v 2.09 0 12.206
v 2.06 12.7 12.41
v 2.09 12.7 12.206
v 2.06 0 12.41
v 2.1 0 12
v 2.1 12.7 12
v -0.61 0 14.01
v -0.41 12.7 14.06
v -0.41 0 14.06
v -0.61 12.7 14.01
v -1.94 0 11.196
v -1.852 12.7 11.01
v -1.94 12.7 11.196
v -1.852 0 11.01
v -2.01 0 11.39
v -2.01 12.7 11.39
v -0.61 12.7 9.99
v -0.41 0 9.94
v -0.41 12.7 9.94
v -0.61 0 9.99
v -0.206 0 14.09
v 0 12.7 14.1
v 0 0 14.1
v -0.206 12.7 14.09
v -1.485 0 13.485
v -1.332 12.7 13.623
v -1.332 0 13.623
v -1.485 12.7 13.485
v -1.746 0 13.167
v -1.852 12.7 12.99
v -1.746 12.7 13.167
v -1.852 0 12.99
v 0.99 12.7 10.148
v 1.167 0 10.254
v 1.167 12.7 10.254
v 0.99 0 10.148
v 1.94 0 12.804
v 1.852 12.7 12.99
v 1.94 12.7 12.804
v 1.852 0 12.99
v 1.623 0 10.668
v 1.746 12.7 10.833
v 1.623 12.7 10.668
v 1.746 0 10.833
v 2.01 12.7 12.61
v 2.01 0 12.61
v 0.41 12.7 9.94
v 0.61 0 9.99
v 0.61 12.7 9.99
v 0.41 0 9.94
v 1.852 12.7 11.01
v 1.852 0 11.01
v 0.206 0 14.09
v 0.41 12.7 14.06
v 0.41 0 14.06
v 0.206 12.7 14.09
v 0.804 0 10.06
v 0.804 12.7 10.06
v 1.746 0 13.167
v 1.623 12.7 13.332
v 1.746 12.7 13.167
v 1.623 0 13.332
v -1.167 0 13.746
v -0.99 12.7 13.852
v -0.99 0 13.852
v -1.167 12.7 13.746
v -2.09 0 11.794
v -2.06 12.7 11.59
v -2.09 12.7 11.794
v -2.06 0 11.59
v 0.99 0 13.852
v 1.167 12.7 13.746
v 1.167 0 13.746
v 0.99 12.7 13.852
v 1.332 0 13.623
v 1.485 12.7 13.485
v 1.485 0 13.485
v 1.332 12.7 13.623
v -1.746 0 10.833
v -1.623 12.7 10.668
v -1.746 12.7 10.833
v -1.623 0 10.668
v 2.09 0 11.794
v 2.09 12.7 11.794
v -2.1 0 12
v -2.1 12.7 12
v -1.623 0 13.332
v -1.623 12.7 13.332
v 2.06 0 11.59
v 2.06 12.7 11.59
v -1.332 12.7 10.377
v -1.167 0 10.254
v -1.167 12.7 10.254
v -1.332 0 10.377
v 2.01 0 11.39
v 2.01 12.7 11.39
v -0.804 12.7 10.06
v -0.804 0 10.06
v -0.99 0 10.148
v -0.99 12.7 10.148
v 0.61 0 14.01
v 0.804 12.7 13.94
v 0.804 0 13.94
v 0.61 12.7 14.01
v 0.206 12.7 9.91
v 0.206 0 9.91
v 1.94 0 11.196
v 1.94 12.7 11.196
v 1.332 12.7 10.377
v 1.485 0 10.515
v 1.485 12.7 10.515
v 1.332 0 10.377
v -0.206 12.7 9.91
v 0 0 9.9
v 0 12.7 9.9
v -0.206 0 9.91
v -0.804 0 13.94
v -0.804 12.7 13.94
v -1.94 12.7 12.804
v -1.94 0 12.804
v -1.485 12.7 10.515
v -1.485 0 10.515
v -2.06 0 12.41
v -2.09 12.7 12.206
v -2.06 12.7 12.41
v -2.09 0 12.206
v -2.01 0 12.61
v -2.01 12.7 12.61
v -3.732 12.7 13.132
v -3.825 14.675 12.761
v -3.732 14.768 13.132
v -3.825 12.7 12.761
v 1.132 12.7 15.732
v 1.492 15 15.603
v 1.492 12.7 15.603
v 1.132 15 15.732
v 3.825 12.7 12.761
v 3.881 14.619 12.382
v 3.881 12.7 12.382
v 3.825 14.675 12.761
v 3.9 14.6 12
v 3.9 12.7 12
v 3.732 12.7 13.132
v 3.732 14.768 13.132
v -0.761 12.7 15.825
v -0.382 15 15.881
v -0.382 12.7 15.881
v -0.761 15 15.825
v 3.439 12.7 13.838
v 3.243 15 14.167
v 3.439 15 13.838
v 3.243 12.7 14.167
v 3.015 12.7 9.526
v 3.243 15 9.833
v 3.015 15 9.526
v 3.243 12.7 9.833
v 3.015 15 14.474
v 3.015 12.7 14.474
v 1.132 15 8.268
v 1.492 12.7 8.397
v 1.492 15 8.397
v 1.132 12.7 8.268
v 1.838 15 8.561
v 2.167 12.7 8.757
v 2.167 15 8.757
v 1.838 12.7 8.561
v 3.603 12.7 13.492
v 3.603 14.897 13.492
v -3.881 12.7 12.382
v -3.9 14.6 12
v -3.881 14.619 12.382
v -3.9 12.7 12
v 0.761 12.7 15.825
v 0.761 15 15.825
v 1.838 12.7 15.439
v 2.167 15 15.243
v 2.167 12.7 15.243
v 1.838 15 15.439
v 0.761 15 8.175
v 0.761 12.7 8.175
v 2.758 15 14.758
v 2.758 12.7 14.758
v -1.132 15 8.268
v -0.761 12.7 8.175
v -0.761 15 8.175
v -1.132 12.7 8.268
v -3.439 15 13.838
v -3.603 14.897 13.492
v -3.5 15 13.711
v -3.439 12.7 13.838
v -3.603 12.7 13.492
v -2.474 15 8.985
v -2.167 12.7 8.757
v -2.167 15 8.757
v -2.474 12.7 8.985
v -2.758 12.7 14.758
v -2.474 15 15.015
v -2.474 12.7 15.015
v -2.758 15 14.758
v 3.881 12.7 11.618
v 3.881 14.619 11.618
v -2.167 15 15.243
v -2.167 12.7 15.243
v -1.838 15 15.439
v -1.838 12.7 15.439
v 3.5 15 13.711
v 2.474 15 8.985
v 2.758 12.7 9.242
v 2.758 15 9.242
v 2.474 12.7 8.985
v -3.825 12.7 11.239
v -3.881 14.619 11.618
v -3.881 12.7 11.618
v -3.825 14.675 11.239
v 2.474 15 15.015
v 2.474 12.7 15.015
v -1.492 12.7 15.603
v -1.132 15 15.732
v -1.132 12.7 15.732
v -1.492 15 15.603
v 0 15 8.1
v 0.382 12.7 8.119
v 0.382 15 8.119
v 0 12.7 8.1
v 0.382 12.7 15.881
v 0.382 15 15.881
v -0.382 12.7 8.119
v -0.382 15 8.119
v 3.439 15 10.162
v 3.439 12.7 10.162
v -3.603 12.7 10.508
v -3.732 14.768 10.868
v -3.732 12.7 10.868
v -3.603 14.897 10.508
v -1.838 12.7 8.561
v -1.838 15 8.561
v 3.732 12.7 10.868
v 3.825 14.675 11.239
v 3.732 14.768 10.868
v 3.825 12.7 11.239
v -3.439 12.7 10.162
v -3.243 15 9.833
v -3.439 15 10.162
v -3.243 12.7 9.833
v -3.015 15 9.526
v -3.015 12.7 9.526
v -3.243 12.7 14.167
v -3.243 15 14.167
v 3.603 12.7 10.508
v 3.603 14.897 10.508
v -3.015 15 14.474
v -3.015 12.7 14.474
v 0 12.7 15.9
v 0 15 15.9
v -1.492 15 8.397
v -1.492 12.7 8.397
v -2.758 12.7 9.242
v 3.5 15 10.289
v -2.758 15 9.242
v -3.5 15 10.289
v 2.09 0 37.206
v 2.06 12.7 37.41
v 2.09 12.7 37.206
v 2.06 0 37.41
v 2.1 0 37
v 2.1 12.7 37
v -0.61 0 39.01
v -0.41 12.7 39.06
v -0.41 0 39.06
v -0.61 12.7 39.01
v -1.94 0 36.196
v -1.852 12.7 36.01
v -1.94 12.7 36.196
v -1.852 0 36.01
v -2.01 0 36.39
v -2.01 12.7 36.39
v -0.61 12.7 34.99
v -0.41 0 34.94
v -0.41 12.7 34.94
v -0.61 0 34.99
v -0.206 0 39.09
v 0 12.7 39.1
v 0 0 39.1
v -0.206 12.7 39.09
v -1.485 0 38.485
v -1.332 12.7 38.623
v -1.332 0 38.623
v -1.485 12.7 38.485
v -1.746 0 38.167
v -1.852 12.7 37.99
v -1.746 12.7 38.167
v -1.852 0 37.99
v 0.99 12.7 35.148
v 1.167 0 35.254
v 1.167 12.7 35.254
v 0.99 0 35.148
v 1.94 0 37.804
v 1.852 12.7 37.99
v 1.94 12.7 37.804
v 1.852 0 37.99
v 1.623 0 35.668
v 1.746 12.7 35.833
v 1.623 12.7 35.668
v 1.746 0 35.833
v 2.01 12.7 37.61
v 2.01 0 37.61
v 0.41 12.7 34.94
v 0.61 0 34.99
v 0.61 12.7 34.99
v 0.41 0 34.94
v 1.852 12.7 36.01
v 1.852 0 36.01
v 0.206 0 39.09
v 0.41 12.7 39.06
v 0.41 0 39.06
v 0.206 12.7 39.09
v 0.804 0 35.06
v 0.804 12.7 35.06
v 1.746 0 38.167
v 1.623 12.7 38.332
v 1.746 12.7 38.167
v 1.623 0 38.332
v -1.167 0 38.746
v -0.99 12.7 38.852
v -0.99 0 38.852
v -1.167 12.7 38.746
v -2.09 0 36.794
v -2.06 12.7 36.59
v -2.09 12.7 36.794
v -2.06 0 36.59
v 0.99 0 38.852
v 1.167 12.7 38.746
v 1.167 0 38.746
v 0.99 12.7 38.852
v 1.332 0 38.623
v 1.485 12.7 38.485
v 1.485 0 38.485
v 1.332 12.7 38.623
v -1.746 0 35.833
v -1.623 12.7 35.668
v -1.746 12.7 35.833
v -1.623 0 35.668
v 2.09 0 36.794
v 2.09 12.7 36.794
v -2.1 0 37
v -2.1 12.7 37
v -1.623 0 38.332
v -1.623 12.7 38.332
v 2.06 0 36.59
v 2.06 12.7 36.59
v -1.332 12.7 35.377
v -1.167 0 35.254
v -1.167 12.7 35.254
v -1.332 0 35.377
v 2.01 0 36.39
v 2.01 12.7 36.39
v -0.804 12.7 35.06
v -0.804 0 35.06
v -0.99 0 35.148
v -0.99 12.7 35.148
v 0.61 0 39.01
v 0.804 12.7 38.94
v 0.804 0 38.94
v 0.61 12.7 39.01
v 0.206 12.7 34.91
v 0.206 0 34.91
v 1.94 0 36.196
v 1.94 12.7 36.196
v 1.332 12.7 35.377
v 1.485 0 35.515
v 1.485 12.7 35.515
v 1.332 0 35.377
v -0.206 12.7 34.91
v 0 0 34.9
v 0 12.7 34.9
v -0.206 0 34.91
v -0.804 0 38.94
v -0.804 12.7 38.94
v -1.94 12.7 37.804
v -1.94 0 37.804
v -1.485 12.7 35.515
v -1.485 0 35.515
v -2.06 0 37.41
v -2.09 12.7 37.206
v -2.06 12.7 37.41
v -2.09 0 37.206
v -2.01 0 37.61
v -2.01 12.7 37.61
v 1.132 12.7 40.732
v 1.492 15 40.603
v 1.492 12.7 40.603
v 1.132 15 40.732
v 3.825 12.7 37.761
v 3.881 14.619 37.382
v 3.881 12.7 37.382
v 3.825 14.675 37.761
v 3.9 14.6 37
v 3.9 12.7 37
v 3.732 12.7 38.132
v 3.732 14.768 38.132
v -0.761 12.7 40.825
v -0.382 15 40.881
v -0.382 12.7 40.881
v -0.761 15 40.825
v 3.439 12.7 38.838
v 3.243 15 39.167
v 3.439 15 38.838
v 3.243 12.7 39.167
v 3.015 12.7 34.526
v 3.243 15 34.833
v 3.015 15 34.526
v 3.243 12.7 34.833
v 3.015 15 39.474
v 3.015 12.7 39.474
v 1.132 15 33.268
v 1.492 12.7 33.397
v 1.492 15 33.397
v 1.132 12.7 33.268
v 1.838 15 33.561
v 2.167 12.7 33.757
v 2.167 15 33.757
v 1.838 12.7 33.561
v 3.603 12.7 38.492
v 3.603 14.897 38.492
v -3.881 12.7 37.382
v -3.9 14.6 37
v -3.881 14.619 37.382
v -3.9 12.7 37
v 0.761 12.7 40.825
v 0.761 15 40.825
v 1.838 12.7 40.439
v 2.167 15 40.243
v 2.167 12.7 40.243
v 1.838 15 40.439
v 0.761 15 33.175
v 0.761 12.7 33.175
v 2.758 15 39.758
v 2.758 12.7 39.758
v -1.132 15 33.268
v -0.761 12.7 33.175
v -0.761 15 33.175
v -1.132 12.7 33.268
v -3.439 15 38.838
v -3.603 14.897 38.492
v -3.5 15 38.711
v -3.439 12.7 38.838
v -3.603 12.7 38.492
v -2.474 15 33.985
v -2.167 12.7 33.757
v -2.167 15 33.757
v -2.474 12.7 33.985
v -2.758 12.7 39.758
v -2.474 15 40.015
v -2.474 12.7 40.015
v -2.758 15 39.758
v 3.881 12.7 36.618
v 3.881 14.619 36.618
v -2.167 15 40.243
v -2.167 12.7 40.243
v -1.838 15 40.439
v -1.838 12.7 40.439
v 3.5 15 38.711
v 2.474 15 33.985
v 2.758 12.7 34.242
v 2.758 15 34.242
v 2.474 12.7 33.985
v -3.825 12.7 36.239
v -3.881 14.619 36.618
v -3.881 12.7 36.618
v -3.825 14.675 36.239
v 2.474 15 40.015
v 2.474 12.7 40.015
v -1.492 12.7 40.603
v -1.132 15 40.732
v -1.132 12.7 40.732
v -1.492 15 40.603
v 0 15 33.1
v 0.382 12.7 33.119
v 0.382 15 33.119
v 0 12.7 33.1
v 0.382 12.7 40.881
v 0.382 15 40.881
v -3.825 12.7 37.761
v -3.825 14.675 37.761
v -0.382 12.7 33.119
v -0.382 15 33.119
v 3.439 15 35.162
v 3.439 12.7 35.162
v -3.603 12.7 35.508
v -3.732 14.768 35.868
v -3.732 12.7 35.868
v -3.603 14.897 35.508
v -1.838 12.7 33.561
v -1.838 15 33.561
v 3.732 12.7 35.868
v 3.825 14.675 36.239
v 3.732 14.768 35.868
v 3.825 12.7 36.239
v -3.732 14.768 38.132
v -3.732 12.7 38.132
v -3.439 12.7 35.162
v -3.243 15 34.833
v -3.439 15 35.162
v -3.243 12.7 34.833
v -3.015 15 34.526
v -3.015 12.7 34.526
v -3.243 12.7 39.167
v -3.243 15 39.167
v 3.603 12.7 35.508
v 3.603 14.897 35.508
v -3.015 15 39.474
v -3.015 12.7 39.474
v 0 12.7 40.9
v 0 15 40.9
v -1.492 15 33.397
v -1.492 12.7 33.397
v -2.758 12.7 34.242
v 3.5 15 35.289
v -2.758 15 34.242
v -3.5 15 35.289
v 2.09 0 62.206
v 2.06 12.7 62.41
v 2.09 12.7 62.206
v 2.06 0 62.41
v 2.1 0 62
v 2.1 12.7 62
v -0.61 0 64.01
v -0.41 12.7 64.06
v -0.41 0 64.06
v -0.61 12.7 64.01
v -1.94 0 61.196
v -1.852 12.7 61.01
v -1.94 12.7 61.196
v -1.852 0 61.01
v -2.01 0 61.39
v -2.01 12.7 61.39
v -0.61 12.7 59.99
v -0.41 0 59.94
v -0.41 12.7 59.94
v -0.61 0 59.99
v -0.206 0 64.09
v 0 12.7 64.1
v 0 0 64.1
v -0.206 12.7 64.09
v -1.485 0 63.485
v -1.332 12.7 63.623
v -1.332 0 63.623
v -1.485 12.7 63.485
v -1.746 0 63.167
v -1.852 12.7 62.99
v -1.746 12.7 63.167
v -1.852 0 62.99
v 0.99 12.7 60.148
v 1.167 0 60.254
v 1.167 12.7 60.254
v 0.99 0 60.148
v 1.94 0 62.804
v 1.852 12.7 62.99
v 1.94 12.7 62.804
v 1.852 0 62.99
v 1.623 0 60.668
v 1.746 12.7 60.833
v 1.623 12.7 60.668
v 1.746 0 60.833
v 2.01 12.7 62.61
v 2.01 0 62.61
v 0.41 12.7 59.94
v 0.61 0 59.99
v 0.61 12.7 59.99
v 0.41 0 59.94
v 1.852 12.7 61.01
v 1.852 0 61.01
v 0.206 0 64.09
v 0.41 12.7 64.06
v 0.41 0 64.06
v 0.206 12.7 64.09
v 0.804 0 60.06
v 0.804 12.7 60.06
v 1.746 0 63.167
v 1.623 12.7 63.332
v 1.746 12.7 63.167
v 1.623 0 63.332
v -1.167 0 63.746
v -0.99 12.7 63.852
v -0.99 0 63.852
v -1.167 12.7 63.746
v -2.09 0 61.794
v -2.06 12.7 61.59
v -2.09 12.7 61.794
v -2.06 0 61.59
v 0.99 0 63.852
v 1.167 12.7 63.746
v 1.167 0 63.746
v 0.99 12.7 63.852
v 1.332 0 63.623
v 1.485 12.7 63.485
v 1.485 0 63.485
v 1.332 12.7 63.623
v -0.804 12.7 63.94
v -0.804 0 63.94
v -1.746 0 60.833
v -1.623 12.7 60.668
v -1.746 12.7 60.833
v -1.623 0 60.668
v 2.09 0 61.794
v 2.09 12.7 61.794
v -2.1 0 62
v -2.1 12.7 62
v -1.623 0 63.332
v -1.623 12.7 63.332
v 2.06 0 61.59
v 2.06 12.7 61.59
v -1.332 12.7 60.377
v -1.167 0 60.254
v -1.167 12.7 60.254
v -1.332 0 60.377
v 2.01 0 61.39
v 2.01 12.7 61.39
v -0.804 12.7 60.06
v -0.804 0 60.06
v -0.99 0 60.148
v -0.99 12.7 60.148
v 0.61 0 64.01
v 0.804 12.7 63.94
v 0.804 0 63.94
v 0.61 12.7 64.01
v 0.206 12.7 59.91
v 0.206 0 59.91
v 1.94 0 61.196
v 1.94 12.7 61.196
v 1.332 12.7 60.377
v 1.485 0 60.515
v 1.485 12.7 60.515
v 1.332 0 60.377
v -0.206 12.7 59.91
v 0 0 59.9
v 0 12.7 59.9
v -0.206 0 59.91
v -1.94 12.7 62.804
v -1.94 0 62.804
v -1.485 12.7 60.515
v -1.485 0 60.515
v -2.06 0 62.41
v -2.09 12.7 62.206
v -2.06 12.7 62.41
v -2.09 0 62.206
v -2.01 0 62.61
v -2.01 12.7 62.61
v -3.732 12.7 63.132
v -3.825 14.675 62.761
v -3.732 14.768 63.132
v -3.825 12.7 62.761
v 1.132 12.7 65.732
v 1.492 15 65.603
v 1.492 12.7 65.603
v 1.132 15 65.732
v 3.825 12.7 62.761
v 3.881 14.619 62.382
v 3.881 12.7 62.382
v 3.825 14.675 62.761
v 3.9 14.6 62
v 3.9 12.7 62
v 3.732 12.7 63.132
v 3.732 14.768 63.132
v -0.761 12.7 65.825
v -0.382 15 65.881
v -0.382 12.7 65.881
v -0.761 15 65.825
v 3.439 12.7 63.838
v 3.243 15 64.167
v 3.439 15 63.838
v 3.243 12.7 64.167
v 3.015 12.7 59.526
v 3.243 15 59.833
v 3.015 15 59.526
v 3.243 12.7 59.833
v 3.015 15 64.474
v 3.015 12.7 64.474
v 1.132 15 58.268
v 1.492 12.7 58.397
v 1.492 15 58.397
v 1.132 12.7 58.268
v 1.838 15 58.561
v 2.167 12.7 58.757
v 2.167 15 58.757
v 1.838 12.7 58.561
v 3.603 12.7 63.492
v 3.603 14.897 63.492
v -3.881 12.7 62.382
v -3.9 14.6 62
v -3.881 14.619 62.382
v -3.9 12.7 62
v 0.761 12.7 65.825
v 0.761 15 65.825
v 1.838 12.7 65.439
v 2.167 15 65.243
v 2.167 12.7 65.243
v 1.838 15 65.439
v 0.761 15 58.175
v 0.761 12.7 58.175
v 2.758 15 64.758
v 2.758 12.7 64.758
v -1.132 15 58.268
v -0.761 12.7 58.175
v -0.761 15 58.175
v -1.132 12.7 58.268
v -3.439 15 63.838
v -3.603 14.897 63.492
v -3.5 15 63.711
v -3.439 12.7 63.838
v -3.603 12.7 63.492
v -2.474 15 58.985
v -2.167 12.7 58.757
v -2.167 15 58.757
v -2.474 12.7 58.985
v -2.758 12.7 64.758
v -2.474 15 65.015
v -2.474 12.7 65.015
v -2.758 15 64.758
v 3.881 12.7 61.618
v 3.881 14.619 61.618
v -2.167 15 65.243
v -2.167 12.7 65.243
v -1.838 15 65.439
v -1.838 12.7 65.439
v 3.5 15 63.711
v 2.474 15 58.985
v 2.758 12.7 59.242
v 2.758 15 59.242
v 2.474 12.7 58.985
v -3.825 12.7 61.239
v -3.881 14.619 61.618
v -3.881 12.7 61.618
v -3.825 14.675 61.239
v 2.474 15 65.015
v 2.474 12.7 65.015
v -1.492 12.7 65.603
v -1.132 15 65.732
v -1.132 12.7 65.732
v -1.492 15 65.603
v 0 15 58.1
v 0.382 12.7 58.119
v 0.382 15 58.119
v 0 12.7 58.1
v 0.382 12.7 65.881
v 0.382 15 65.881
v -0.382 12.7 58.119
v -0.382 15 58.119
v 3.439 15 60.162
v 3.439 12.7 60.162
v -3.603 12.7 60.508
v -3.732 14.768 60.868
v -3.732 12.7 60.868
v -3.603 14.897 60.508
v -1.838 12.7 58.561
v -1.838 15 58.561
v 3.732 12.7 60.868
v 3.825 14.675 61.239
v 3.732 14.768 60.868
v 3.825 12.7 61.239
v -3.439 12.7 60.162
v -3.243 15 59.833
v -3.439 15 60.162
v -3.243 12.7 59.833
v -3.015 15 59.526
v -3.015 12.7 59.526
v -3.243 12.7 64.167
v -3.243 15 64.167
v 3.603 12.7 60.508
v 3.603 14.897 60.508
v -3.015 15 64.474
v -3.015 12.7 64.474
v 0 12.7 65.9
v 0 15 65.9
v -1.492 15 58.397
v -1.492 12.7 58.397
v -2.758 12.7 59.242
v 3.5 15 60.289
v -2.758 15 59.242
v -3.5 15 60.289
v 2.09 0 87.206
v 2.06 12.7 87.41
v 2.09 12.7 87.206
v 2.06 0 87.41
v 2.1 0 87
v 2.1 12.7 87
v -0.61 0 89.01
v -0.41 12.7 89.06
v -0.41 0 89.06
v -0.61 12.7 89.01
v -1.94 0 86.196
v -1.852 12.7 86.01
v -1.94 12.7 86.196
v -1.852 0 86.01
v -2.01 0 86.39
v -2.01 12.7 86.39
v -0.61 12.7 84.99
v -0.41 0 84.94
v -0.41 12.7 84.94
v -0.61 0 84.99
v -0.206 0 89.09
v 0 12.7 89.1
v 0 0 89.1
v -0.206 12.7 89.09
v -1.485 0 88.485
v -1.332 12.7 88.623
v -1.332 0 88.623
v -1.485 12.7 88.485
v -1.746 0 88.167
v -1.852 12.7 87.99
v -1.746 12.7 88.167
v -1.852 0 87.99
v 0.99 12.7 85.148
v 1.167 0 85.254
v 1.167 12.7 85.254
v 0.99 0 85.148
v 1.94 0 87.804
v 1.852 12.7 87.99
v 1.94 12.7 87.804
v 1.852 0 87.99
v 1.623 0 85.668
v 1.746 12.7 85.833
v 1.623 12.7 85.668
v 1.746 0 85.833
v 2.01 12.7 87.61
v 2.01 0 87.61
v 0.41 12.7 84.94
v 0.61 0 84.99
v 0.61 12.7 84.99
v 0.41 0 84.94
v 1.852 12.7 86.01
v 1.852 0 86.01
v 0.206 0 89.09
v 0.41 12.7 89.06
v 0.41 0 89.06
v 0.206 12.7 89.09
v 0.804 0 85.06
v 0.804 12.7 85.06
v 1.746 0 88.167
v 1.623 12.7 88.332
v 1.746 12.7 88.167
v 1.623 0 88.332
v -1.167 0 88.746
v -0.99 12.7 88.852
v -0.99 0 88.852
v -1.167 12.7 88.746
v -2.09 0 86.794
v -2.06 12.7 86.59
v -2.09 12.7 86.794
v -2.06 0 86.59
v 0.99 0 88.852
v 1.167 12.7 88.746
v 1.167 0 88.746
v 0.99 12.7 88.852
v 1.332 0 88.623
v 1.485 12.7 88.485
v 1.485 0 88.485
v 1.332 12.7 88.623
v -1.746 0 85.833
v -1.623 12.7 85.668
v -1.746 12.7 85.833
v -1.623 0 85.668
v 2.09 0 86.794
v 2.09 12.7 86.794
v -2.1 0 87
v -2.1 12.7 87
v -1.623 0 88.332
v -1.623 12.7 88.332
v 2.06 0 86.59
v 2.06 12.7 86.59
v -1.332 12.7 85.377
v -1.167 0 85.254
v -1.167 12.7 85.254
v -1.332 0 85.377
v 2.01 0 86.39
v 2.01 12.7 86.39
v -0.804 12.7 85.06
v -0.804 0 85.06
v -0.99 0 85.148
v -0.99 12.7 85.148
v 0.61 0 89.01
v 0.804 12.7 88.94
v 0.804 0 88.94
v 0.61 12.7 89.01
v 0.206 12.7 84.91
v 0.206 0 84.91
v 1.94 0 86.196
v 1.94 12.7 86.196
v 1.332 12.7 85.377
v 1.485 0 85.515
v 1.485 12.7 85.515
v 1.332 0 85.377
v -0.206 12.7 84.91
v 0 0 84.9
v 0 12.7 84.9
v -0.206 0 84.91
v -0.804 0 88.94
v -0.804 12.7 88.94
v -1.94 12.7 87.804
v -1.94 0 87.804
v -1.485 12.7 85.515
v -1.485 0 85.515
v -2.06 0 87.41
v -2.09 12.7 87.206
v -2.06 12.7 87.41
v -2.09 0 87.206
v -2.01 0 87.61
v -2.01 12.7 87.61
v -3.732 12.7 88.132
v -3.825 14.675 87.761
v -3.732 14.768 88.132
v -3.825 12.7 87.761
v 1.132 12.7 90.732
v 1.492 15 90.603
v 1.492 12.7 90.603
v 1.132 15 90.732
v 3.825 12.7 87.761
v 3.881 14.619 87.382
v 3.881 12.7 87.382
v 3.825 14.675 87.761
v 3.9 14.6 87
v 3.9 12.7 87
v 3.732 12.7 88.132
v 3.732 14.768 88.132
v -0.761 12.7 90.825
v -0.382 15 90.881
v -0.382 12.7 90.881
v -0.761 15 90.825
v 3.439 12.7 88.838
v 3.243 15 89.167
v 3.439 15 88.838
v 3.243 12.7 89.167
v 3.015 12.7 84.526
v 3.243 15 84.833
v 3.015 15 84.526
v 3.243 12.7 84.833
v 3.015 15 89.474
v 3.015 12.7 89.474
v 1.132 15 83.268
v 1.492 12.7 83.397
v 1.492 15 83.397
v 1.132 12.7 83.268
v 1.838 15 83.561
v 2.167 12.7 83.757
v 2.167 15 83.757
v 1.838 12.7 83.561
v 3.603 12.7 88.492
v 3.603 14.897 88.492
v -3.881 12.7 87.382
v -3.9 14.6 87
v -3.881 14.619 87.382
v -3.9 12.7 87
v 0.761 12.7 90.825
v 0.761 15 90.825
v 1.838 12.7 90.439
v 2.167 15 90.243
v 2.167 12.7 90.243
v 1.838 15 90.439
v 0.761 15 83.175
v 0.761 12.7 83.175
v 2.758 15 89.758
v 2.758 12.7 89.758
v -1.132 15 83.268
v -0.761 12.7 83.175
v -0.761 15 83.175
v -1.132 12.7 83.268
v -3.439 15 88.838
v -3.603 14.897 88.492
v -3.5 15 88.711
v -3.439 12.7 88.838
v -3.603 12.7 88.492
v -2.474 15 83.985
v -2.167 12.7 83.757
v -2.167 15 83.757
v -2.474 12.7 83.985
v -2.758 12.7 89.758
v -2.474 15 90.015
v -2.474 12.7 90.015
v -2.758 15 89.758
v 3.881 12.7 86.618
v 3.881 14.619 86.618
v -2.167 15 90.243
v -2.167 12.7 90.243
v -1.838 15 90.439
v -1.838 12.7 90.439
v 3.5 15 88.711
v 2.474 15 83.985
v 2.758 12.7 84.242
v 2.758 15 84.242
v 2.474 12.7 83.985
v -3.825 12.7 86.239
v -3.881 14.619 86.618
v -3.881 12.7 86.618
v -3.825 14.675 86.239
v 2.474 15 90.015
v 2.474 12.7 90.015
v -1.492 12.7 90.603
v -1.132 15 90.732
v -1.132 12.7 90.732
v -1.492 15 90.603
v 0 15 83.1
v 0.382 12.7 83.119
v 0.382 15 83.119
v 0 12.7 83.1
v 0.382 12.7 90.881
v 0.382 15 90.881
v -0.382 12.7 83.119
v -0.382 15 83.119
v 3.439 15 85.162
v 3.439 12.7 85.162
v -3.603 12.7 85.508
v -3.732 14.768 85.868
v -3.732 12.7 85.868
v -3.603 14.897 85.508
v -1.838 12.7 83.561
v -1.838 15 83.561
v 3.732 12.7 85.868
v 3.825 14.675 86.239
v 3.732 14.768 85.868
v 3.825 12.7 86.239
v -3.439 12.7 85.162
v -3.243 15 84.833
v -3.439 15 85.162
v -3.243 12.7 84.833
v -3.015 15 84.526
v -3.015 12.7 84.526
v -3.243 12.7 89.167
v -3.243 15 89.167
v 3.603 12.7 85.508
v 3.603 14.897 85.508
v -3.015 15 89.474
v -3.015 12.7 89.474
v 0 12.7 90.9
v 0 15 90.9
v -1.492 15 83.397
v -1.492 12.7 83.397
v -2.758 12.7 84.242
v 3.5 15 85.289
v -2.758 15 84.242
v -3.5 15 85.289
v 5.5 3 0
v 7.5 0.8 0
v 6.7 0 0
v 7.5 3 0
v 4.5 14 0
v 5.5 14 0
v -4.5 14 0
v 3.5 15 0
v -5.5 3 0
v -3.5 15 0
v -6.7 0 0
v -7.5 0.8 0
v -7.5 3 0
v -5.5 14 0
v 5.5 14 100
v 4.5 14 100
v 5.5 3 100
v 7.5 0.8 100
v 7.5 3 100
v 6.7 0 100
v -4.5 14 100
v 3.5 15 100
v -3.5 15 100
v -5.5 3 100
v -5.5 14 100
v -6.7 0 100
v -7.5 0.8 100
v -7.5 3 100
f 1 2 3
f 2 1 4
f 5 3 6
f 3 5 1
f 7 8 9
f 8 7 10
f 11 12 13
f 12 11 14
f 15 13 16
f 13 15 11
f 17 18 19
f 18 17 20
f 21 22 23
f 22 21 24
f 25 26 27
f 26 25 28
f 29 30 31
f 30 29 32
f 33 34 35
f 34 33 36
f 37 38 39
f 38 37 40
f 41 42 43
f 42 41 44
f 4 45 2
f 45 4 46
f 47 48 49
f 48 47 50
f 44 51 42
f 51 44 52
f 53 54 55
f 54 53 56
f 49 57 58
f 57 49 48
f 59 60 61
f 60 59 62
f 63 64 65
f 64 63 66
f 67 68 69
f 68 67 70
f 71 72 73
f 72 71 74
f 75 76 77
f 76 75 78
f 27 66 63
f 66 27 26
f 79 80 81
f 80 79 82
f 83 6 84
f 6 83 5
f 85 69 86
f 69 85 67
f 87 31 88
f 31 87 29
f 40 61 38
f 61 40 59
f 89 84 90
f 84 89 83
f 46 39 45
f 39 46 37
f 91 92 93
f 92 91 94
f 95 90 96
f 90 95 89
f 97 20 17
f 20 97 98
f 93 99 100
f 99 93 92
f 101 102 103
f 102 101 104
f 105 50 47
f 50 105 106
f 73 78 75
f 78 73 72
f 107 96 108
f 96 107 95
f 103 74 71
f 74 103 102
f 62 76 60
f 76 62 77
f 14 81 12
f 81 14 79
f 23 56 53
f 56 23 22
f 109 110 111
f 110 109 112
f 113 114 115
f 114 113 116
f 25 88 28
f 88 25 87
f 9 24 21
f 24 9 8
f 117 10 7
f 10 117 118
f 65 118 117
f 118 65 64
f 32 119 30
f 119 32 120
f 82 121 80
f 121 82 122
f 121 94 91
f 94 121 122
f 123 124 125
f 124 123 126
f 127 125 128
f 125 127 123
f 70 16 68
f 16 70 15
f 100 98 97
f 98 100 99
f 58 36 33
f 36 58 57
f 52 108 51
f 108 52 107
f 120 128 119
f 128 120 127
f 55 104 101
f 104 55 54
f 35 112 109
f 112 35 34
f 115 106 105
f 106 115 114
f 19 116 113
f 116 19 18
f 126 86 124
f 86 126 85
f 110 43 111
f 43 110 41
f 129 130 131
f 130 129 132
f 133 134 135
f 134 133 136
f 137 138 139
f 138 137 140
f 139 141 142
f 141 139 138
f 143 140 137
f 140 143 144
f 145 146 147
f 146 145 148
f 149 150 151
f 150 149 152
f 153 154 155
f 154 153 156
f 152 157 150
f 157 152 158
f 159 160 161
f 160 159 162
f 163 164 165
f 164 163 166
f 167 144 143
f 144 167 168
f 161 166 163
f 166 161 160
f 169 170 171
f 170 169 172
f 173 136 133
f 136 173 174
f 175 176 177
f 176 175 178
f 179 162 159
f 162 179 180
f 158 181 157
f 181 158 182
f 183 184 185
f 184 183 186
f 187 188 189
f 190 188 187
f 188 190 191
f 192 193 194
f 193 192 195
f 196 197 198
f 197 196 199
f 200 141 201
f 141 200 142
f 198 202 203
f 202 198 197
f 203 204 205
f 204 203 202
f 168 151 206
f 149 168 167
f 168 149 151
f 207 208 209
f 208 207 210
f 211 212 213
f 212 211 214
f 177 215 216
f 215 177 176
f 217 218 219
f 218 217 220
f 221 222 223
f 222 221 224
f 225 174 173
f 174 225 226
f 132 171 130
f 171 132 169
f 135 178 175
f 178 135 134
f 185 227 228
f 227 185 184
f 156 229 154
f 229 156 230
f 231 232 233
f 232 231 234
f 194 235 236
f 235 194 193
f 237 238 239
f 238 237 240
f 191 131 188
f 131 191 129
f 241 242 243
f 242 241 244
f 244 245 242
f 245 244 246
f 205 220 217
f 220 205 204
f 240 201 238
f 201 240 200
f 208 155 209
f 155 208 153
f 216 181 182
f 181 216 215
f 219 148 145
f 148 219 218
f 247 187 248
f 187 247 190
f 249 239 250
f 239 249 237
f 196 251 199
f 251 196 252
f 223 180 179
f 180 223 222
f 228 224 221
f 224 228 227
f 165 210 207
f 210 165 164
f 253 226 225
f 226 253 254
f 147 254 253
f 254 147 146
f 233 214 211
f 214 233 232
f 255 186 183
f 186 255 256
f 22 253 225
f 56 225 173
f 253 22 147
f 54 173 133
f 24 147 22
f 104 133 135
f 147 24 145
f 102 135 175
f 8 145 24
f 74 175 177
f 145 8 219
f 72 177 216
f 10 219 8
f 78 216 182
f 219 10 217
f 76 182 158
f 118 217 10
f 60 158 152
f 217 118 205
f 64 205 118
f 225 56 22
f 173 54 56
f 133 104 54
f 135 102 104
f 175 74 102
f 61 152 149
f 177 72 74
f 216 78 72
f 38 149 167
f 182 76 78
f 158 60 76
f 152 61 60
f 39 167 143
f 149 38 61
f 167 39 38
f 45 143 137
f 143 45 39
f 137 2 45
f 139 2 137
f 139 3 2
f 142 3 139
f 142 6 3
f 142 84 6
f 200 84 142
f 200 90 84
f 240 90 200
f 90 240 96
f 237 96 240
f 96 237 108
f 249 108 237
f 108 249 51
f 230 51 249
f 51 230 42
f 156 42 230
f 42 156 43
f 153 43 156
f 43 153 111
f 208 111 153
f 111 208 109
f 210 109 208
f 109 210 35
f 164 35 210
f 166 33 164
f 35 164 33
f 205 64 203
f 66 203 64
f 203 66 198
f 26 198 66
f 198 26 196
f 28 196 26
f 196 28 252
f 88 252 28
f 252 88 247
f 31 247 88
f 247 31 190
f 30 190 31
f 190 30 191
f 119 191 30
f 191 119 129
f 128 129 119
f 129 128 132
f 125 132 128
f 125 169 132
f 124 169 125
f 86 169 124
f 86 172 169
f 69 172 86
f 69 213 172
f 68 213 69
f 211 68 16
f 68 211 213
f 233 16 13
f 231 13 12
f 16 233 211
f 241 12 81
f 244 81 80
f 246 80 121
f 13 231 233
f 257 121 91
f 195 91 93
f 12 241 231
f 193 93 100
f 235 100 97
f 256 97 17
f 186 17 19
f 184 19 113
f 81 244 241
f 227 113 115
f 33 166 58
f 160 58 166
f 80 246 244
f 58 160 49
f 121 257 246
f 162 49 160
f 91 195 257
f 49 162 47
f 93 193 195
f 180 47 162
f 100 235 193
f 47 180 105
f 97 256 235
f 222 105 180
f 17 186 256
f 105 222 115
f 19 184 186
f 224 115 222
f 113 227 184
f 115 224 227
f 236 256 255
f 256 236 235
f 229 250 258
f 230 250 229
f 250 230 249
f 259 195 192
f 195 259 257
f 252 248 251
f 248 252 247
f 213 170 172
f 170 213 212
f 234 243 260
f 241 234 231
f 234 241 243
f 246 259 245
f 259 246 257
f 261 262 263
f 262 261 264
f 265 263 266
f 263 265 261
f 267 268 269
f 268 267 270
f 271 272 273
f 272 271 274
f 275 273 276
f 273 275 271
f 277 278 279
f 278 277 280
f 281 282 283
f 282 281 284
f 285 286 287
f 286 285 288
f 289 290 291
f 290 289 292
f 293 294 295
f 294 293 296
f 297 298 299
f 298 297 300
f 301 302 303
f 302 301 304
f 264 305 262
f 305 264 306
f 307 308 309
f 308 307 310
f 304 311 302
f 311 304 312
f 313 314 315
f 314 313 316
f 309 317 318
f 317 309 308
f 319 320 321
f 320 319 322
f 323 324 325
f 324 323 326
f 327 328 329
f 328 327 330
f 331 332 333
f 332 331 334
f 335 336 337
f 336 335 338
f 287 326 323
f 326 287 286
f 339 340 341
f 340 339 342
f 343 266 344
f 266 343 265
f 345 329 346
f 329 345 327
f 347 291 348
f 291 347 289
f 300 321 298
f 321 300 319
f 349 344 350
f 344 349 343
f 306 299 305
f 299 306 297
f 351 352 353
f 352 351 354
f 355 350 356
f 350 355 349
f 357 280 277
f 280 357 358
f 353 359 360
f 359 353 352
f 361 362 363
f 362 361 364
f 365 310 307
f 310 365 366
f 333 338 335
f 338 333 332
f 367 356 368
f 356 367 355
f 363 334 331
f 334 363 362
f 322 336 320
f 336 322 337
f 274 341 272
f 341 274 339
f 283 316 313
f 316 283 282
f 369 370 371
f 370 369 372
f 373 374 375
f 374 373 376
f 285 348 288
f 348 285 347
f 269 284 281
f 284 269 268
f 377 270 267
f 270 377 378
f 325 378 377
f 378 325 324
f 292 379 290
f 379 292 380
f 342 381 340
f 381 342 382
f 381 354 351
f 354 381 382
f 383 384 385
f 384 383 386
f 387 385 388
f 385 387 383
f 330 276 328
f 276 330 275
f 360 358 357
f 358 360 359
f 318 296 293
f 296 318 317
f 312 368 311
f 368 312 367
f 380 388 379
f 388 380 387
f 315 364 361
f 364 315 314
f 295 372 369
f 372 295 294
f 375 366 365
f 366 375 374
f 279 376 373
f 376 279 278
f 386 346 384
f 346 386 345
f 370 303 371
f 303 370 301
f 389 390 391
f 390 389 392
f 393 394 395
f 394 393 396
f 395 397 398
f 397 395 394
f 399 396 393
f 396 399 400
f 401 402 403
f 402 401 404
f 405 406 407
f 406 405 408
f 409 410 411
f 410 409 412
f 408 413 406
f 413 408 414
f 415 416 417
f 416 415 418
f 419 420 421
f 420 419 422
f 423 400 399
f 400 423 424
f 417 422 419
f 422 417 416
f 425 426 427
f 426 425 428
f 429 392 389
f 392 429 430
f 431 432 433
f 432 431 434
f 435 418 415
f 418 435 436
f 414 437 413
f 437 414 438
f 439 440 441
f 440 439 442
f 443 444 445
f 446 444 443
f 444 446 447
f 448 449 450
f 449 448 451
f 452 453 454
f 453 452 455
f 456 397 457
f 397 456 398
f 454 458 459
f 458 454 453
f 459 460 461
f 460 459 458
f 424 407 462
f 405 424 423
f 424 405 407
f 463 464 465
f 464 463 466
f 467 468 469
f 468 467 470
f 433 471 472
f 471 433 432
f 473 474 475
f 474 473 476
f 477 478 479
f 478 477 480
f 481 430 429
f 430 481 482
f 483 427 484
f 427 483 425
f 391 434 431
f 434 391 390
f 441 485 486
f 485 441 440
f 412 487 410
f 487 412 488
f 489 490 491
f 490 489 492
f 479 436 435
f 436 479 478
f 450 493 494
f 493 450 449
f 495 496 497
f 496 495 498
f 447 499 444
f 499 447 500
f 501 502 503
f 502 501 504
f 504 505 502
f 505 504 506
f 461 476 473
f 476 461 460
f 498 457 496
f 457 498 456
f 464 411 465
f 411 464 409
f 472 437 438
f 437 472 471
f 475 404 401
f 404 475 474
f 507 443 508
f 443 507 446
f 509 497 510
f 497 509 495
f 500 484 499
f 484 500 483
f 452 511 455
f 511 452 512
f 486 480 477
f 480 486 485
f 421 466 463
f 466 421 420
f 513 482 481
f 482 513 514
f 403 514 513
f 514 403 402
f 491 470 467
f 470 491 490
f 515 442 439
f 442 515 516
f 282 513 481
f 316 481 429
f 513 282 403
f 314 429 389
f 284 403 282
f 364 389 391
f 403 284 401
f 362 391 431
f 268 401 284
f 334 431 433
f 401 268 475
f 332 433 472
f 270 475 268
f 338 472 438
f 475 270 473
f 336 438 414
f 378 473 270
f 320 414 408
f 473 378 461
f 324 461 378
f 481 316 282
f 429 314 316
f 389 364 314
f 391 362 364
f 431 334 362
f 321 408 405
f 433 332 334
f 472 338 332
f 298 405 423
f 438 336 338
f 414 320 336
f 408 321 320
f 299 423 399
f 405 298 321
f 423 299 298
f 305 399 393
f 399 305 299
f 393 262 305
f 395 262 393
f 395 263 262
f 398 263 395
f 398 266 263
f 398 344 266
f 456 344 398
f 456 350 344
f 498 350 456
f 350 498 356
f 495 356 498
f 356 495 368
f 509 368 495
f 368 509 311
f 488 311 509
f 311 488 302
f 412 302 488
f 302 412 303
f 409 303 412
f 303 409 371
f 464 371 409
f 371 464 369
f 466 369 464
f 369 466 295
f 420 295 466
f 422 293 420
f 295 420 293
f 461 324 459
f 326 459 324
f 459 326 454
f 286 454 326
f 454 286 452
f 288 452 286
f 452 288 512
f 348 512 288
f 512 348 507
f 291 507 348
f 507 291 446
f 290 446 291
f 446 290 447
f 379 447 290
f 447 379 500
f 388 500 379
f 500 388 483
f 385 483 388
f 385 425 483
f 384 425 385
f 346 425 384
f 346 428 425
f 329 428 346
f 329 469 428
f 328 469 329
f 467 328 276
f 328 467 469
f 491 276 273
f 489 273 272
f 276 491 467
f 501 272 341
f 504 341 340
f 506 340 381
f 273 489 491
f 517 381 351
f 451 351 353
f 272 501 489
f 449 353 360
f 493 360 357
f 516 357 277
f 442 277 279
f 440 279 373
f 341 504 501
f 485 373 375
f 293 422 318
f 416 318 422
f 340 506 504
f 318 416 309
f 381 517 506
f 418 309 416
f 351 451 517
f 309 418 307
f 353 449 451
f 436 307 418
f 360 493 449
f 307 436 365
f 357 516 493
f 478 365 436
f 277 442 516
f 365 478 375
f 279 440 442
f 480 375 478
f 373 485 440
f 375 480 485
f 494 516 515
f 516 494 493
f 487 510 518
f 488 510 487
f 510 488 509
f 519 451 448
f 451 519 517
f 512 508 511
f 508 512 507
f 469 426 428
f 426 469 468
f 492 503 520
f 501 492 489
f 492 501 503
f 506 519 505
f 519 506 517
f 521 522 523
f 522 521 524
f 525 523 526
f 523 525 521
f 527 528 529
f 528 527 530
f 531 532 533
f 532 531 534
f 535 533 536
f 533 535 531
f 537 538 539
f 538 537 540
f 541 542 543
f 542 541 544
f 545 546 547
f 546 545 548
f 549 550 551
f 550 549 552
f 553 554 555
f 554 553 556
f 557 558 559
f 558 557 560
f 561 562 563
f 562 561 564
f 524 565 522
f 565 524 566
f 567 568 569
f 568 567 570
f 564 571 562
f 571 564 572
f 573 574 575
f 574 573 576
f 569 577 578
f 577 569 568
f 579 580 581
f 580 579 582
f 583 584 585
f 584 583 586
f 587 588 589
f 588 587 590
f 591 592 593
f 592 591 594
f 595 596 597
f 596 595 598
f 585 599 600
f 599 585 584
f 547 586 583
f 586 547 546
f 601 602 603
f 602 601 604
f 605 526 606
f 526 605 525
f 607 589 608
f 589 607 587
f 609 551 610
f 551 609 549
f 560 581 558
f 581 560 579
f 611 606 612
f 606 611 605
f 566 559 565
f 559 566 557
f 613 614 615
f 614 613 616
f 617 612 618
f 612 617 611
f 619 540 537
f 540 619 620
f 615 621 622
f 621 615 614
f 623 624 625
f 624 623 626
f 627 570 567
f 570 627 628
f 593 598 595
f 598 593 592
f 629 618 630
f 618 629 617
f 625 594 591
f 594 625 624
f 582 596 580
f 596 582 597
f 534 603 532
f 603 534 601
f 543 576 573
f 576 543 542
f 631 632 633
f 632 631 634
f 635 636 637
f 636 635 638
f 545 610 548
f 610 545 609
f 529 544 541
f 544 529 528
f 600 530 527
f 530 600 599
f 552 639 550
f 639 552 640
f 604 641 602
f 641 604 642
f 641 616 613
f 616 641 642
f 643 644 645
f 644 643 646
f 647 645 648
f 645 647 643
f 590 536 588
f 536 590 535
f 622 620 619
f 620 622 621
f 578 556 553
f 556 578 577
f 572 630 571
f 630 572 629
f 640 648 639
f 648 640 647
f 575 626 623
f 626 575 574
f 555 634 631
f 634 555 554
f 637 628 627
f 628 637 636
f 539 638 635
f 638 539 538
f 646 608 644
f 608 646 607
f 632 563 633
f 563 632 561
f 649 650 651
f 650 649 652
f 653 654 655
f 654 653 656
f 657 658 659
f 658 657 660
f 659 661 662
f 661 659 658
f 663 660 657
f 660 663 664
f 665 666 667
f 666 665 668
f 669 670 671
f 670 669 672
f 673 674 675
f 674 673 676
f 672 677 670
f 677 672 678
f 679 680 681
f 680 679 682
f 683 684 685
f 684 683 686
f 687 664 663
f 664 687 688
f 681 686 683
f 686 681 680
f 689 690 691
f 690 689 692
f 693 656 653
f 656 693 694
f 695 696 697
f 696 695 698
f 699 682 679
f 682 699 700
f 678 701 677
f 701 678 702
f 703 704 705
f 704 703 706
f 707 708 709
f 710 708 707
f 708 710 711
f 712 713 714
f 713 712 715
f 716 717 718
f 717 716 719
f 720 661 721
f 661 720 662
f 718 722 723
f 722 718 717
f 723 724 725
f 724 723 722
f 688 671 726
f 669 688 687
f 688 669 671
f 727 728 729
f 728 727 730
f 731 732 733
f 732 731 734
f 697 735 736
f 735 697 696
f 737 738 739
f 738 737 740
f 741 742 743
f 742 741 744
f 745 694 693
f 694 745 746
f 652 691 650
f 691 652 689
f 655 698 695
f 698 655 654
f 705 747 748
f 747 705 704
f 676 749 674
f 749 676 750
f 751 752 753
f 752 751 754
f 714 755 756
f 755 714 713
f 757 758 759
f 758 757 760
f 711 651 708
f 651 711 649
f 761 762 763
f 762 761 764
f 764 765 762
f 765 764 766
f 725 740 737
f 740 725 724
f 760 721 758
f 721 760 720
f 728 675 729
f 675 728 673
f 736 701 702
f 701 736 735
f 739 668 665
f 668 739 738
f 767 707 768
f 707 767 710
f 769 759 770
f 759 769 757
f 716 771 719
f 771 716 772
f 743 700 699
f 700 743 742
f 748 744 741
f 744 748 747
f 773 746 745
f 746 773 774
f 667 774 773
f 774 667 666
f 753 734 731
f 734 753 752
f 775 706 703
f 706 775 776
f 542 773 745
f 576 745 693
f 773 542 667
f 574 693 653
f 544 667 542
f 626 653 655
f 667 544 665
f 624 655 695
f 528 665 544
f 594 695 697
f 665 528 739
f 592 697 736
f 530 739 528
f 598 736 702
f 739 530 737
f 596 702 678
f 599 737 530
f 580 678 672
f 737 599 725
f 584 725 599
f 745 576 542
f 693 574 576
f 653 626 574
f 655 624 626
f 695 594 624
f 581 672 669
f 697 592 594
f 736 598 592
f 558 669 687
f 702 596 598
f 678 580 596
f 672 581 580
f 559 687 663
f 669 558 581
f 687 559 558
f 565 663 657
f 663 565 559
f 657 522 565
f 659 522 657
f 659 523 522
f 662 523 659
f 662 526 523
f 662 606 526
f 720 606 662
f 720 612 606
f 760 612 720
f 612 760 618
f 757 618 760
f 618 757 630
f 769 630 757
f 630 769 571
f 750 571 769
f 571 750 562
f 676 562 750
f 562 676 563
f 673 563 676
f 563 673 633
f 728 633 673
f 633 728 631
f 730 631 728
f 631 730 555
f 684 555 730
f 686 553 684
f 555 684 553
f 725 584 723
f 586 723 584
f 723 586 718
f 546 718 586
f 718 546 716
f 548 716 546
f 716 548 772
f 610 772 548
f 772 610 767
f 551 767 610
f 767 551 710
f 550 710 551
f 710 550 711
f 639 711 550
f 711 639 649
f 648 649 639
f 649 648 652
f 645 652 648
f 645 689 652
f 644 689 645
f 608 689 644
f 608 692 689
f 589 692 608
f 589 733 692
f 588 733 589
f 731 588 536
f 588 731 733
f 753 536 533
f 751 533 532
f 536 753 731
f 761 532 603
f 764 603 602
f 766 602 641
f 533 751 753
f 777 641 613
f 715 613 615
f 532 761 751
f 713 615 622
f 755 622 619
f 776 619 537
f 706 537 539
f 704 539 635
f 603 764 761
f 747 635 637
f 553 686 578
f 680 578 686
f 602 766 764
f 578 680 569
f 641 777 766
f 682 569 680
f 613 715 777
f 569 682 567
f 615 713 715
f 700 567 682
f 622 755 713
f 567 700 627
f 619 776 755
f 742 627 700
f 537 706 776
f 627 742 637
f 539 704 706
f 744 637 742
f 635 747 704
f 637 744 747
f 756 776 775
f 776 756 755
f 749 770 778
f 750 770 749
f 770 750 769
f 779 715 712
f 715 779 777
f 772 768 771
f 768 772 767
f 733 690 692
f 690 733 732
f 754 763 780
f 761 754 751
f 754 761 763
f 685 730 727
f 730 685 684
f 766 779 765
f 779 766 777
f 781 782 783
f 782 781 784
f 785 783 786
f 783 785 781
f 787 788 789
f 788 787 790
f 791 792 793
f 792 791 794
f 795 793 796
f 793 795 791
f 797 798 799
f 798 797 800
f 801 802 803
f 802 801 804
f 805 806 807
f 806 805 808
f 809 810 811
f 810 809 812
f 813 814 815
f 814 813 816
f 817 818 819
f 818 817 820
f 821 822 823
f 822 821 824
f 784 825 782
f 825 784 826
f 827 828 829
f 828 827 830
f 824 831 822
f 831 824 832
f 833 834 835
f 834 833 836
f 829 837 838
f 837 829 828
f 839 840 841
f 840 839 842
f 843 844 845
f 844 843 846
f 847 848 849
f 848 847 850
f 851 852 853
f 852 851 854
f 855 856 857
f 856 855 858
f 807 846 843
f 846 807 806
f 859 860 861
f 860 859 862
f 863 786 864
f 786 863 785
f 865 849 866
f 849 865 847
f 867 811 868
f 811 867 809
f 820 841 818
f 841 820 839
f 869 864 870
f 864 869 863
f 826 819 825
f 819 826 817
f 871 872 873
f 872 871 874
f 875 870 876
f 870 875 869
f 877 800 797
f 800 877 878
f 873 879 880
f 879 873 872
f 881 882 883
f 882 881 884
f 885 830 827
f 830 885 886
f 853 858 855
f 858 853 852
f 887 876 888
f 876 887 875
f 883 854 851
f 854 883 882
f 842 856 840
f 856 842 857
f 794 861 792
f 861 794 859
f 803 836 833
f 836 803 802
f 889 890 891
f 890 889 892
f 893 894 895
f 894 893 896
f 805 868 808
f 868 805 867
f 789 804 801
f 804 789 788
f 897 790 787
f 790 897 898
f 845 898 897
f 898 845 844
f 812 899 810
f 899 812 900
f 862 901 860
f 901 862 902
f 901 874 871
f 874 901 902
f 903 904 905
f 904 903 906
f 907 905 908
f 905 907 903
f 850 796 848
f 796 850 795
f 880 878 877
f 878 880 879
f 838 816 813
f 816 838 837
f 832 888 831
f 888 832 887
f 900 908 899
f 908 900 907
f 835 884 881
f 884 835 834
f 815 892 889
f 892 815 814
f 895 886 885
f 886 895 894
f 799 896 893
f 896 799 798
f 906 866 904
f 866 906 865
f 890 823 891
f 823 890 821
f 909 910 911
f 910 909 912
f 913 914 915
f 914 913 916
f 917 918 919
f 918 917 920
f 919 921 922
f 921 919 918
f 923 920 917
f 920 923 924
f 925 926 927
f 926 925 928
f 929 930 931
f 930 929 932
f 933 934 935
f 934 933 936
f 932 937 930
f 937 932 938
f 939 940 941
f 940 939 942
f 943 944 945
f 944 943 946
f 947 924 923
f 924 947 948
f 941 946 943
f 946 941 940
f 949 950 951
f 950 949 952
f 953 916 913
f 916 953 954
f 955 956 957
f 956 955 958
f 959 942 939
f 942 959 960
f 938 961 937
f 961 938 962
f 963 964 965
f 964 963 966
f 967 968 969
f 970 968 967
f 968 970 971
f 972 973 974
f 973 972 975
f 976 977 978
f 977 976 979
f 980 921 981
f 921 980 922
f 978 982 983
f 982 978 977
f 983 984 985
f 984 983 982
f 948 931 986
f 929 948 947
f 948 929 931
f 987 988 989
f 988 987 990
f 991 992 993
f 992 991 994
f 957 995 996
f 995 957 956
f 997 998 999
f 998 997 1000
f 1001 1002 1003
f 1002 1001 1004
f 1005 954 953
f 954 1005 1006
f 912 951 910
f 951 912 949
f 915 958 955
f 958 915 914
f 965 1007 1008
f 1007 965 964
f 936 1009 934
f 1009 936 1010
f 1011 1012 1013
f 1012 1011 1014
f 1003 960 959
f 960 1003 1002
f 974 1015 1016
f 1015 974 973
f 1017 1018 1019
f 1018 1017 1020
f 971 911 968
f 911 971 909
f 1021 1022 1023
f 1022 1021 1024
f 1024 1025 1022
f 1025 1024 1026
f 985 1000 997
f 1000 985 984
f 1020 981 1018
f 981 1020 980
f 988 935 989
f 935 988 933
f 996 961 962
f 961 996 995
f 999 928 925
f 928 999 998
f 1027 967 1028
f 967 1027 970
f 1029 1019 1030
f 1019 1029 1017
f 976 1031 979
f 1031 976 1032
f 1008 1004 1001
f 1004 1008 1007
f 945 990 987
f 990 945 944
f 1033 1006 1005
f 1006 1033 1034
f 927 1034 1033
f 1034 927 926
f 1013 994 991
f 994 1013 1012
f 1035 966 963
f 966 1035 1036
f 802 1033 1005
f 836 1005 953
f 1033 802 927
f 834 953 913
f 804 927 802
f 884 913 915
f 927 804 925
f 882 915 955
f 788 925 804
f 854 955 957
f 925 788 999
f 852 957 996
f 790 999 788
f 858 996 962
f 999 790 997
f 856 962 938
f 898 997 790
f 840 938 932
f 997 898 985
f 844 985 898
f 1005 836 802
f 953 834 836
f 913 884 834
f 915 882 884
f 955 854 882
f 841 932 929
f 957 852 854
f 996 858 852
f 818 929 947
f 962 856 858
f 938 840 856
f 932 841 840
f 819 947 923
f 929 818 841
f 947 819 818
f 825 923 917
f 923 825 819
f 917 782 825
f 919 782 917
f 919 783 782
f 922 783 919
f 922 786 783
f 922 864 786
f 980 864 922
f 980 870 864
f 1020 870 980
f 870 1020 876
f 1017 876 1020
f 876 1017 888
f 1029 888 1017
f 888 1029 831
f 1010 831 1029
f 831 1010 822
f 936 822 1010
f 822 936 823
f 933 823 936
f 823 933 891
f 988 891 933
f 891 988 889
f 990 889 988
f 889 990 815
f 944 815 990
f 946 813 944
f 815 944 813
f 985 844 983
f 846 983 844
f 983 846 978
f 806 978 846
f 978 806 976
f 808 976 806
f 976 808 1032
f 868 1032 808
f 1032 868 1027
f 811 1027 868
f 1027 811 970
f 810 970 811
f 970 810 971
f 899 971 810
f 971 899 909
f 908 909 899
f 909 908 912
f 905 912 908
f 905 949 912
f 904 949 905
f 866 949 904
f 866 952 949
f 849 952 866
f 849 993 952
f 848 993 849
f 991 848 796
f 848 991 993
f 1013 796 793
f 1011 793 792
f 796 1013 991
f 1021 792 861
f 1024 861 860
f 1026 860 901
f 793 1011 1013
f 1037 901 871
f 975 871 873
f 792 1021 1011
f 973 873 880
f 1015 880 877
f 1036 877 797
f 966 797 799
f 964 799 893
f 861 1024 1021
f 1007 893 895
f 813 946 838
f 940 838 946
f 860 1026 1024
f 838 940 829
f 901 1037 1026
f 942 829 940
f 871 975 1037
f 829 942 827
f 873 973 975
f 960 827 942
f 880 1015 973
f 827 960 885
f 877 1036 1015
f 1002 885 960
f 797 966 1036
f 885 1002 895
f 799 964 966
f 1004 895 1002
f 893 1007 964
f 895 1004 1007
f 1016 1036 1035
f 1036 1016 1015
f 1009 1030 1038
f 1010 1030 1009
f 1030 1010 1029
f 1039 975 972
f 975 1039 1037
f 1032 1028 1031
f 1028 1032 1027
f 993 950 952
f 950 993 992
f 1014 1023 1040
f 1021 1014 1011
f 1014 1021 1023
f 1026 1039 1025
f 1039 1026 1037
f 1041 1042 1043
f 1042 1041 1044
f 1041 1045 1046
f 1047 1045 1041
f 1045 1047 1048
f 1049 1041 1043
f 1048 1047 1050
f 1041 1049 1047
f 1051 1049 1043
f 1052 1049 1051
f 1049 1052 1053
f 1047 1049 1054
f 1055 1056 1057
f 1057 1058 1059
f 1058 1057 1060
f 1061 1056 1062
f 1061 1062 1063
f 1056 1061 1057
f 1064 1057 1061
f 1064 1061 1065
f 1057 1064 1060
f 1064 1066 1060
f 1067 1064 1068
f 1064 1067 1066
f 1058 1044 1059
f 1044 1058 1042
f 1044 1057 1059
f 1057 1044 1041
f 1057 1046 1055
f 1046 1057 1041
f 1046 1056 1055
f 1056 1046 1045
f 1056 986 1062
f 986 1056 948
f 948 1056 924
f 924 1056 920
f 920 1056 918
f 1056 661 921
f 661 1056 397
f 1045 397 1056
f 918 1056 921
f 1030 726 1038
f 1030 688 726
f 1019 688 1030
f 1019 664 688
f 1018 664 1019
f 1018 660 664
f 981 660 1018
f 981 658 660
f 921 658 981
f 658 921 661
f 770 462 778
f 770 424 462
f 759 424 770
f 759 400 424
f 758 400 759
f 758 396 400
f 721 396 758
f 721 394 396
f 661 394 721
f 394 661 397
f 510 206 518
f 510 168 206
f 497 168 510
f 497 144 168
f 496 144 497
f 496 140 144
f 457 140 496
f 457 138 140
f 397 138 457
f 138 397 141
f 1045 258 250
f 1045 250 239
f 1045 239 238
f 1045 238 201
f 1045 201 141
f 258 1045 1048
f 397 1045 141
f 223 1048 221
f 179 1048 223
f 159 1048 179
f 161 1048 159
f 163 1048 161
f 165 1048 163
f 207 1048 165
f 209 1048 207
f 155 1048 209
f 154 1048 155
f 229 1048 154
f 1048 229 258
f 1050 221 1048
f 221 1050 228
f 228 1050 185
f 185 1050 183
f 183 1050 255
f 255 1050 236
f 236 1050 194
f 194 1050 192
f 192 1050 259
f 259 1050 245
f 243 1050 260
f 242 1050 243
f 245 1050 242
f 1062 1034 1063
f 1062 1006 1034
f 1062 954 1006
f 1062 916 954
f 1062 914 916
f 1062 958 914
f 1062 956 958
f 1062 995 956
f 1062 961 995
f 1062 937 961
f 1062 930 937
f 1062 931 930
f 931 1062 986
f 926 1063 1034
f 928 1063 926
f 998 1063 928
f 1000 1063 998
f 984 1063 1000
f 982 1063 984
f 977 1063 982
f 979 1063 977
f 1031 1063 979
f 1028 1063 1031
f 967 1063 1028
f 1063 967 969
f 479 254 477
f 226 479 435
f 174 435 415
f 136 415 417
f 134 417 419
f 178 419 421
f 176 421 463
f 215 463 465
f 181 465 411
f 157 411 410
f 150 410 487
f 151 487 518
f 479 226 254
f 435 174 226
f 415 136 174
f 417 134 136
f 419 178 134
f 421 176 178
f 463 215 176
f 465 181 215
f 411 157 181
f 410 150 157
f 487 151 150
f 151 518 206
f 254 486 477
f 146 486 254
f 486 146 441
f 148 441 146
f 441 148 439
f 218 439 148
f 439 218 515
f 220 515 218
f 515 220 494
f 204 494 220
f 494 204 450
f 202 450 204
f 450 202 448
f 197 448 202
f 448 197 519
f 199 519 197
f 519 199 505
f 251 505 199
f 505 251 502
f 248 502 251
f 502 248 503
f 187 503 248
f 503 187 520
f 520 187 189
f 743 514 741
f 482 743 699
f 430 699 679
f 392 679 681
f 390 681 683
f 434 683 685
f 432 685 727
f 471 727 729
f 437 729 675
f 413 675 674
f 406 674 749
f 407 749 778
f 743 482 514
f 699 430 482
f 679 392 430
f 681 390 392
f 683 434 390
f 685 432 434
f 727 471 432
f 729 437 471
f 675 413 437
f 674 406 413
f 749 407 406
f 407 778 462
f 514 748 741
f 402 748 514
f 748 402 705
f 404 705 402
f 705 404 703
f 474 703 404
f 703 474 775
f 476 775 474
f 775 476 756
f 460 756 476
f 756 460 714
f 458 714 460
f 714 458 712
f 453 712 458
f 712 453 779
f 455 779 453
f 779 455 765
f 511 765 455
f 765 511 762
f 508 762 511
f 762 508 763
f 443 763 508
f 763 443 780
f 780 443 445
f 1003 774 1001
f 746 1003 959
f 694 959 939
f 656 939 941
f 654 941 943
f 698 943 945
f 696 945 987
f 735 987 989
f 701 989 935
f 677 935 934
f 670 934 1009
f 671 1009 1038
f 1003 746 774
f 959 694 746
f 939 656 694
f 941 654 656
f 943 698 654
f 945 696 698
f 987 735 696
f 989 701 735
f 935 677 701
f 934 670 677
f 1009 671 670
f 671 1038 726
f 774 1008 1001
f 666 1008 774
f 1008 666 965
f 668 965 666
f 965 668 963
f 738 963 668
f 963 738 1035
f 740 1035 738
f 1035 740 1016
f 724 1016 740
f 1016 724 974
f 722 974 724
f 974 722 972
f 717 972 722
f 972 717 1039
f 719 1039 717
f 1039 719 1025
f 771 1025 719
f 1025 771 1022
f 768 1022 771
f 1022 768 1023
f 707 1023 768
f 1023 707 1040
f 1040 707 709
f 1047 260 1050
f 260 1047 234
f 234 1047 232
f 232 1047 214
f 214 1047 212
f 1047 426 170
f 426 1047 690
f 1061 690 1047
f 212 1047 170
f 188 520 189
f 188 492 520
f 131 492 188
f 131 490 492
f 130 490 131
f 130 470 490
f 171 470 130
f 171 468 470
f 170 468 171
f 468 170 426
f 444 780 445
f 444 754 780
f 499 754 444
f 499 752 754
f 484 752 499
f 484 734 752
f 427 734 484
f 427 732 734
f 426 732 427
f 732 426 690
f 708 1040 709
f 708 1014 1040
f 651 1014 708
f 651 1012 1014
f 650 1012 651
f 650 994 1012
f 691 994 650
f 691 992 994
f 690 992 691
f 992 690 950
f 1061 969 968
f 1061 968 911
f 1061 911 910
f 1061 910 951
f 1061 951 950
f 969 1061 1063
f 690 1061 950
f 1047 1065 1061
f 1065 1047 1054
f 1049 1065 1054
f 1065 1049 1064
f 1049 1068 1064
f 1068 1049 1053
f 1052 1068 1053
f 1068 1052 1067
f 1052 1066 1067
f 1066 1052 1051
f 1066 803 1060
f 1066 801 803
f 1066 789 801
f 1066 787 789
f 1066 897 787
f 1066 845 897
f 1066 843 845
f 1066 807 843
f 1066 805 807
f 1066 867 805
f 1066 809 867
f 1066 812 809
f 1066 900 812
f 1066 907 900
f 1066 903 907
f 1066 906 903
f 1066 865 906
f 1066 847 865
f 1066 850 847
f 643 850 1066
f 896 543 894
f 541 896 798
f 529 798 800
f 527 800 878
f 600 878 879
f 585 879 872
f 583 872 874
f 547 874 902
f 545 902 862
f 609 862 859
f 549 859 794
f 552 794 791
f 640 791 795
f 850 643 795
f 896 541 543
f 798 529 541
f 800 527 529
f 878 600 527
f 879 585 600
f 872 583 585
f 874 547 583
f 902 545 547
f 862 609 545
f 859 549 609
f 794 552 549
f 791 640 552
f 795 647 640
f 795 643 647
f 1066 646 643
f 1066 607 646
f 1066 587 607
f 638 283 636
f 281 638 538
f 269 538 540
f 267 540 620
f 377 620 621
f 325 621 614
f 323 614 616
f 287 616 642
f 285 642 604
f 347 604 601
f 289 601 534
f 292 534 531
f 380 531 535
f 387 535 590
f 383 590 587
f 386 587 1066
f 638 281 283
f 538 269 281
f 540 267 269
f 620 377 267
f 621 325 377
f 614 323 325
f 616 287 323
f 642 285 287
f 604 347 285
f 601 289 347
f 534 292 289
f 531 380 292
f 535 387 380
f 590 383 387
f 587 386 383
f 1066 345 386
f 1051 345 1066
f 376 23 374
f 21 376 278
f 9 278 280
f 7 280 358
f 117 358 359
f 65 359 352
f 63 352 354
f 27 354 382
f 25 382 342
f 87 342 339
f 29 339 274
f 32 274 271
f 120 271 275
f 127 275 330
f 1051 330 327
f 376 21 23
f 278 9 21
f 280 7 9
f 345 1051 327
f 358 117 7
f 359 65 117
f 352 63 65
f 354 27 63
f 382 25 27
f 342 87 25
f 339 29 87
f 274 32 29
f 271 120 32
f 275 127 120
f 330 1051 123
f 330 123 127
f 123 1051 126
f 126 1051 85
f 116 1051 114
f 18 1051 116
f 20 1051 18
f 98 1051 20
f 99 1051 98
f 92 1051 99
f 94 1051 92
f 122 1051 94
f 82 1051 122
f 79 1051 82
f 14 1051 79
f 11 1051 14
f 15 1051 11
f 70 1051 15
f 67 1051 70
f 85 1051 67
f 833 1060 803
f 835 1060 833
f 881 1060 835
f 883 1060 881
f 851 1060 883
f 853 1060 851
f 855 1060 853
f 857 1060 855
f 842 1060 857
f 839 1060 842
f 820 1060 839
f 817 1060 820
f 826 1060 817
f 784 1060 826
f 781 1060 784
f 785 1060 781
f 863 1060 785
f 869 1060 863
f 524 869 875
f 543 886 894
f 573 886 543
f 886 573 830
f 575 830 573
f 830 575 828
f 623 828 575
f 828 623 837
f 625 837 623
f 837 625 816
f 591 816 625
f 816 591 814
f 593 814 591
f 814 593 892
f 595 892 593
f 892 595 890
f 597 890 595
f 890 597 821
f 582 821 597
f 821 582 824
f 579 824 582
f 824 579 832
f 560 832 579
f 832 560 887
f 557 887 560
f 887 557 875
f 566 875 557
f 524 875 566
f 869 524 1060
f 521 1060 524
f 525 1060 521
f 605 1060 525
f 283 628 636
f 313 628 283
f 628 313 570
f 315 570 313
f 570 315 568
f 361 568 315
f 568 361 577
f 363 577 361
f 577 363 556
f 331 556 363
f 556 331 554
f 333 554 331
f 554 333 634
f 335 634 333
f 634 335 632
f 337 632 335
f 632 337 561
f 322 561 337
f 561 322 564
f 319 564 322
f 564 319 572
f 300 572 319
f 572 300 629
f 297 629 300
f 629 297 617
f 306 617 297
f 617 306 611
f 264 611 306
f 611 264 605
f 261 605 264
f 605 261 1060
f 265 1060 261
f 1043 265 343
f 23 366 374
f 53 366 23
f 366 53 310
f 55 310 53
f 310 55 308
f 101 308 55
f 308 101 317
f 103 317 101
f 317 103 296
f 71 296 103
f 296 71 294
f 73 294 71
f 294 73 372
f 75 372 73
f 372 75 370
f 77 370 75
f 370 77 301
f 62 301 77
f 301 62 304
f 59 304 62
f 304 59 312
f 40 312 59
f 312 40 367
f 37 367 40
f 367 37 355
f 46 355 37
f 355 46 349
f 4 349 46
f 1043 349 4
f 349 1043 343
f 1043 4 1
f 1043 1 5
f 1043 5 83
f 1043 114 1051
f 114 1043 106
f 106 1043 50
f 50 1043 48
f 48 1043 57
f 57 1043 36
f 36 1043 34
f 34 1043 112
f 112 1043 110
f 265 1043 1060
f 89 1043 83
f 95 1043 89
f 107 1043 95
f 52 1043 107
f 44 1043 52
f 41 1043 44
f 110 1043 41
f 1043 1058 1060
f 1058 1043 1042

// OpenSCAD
$fn = 64;

// Miniature linear guide rail (approximate profile)
// Overall: 15mm wide, 15mm tall, 100mm long

rail_w = 15.0;
rail_h = 15.0;
rail_l = 100.0;

// Profile details (tunable)
top_flat_w = 7.0;          // width of top flat
side_step_h = 3.0;         // height of lower side step
side_step_inset = 2.0;     // inset from each side at the step
top_chamfer = 1.0;         // chamfer size on top edges
bottom_chamfer = 0.8;      // chamfer size on bottom edges

// Mounting holes (typical rail style)
hole_d = 4.2;              // through hole diameter
csk_d = 7.8;               // counterbore diameter
csk_depth = 2.2;           // counterbore depth
end_margin = 12.0;         // distance from ends to first/last hole
hole_pitch = 25.0;         // spacing
hole_count = floor((rail_l - 2*end_margin)/hole_pitch) + 1;

module rail_profile_2d() {
    // Construct a stepped, chamfered profile within 15x15 envelope
    // Coordinates centered on X, base at Y=0
    w = rail_w;
    h = rail_h;

    // Key x positions
    x0 = -w/2;
    x1 = x0 + bottom_chamfer;
    x2 = -w/2 + side_step_inset;
    x3 = -top_flat_w/2 - top_chamfer;
    x4 = -top_flat_w/2;
    x5 = top_flat_w/2;
    x6 = top_flat_w/2 + top_chamfer;
    x7 = w/2 - side_step_inset;
    x8 = w/2 - bottom_chamfer;
    x9 = w/2;

    // Key y positions
    y0 = 0;
    y1 = bottom_chamfer;
    y2 = side_step_h;
    y3 = h - top_chamfer;
    y4 = h;

    polygon(points=[
        [x1, y0],
        [x8, y0],
        [x9, y1],
        [x9, y2],
        [x7, y2],
        [x7, y3],
        [x6, y3],
        [x5, y4],
        [x4, y4],
        [x3, y3],
        [x2, y3],
        [x2, y2],
        [x0, y2],
        [x0, y1]
    ]);
}

module rail_body() {
    linear_extrude(height=rail_l, center=false, convexity=10)
        rail_profile_2d();
}

module mounting_holes() {
    for (i = [0:hole_count-1]) {
        z = end_margin + i*hole_pitch;
        // Through hole
        translate([0, rail_h/2, z])
            rotate([90,0,0])
                cylinder(d=hole_d, h=rail_h+2, center=true);

        // Counterbore from top
        translate([0, rail_h - csk_depth/2, z])
            rotate([90,0,0])
                cylinder(d=csk_d, h=csk_depth+0.2, center=true);
    }
}

difference() {
    rail_body();
    mounting_holes();
}
